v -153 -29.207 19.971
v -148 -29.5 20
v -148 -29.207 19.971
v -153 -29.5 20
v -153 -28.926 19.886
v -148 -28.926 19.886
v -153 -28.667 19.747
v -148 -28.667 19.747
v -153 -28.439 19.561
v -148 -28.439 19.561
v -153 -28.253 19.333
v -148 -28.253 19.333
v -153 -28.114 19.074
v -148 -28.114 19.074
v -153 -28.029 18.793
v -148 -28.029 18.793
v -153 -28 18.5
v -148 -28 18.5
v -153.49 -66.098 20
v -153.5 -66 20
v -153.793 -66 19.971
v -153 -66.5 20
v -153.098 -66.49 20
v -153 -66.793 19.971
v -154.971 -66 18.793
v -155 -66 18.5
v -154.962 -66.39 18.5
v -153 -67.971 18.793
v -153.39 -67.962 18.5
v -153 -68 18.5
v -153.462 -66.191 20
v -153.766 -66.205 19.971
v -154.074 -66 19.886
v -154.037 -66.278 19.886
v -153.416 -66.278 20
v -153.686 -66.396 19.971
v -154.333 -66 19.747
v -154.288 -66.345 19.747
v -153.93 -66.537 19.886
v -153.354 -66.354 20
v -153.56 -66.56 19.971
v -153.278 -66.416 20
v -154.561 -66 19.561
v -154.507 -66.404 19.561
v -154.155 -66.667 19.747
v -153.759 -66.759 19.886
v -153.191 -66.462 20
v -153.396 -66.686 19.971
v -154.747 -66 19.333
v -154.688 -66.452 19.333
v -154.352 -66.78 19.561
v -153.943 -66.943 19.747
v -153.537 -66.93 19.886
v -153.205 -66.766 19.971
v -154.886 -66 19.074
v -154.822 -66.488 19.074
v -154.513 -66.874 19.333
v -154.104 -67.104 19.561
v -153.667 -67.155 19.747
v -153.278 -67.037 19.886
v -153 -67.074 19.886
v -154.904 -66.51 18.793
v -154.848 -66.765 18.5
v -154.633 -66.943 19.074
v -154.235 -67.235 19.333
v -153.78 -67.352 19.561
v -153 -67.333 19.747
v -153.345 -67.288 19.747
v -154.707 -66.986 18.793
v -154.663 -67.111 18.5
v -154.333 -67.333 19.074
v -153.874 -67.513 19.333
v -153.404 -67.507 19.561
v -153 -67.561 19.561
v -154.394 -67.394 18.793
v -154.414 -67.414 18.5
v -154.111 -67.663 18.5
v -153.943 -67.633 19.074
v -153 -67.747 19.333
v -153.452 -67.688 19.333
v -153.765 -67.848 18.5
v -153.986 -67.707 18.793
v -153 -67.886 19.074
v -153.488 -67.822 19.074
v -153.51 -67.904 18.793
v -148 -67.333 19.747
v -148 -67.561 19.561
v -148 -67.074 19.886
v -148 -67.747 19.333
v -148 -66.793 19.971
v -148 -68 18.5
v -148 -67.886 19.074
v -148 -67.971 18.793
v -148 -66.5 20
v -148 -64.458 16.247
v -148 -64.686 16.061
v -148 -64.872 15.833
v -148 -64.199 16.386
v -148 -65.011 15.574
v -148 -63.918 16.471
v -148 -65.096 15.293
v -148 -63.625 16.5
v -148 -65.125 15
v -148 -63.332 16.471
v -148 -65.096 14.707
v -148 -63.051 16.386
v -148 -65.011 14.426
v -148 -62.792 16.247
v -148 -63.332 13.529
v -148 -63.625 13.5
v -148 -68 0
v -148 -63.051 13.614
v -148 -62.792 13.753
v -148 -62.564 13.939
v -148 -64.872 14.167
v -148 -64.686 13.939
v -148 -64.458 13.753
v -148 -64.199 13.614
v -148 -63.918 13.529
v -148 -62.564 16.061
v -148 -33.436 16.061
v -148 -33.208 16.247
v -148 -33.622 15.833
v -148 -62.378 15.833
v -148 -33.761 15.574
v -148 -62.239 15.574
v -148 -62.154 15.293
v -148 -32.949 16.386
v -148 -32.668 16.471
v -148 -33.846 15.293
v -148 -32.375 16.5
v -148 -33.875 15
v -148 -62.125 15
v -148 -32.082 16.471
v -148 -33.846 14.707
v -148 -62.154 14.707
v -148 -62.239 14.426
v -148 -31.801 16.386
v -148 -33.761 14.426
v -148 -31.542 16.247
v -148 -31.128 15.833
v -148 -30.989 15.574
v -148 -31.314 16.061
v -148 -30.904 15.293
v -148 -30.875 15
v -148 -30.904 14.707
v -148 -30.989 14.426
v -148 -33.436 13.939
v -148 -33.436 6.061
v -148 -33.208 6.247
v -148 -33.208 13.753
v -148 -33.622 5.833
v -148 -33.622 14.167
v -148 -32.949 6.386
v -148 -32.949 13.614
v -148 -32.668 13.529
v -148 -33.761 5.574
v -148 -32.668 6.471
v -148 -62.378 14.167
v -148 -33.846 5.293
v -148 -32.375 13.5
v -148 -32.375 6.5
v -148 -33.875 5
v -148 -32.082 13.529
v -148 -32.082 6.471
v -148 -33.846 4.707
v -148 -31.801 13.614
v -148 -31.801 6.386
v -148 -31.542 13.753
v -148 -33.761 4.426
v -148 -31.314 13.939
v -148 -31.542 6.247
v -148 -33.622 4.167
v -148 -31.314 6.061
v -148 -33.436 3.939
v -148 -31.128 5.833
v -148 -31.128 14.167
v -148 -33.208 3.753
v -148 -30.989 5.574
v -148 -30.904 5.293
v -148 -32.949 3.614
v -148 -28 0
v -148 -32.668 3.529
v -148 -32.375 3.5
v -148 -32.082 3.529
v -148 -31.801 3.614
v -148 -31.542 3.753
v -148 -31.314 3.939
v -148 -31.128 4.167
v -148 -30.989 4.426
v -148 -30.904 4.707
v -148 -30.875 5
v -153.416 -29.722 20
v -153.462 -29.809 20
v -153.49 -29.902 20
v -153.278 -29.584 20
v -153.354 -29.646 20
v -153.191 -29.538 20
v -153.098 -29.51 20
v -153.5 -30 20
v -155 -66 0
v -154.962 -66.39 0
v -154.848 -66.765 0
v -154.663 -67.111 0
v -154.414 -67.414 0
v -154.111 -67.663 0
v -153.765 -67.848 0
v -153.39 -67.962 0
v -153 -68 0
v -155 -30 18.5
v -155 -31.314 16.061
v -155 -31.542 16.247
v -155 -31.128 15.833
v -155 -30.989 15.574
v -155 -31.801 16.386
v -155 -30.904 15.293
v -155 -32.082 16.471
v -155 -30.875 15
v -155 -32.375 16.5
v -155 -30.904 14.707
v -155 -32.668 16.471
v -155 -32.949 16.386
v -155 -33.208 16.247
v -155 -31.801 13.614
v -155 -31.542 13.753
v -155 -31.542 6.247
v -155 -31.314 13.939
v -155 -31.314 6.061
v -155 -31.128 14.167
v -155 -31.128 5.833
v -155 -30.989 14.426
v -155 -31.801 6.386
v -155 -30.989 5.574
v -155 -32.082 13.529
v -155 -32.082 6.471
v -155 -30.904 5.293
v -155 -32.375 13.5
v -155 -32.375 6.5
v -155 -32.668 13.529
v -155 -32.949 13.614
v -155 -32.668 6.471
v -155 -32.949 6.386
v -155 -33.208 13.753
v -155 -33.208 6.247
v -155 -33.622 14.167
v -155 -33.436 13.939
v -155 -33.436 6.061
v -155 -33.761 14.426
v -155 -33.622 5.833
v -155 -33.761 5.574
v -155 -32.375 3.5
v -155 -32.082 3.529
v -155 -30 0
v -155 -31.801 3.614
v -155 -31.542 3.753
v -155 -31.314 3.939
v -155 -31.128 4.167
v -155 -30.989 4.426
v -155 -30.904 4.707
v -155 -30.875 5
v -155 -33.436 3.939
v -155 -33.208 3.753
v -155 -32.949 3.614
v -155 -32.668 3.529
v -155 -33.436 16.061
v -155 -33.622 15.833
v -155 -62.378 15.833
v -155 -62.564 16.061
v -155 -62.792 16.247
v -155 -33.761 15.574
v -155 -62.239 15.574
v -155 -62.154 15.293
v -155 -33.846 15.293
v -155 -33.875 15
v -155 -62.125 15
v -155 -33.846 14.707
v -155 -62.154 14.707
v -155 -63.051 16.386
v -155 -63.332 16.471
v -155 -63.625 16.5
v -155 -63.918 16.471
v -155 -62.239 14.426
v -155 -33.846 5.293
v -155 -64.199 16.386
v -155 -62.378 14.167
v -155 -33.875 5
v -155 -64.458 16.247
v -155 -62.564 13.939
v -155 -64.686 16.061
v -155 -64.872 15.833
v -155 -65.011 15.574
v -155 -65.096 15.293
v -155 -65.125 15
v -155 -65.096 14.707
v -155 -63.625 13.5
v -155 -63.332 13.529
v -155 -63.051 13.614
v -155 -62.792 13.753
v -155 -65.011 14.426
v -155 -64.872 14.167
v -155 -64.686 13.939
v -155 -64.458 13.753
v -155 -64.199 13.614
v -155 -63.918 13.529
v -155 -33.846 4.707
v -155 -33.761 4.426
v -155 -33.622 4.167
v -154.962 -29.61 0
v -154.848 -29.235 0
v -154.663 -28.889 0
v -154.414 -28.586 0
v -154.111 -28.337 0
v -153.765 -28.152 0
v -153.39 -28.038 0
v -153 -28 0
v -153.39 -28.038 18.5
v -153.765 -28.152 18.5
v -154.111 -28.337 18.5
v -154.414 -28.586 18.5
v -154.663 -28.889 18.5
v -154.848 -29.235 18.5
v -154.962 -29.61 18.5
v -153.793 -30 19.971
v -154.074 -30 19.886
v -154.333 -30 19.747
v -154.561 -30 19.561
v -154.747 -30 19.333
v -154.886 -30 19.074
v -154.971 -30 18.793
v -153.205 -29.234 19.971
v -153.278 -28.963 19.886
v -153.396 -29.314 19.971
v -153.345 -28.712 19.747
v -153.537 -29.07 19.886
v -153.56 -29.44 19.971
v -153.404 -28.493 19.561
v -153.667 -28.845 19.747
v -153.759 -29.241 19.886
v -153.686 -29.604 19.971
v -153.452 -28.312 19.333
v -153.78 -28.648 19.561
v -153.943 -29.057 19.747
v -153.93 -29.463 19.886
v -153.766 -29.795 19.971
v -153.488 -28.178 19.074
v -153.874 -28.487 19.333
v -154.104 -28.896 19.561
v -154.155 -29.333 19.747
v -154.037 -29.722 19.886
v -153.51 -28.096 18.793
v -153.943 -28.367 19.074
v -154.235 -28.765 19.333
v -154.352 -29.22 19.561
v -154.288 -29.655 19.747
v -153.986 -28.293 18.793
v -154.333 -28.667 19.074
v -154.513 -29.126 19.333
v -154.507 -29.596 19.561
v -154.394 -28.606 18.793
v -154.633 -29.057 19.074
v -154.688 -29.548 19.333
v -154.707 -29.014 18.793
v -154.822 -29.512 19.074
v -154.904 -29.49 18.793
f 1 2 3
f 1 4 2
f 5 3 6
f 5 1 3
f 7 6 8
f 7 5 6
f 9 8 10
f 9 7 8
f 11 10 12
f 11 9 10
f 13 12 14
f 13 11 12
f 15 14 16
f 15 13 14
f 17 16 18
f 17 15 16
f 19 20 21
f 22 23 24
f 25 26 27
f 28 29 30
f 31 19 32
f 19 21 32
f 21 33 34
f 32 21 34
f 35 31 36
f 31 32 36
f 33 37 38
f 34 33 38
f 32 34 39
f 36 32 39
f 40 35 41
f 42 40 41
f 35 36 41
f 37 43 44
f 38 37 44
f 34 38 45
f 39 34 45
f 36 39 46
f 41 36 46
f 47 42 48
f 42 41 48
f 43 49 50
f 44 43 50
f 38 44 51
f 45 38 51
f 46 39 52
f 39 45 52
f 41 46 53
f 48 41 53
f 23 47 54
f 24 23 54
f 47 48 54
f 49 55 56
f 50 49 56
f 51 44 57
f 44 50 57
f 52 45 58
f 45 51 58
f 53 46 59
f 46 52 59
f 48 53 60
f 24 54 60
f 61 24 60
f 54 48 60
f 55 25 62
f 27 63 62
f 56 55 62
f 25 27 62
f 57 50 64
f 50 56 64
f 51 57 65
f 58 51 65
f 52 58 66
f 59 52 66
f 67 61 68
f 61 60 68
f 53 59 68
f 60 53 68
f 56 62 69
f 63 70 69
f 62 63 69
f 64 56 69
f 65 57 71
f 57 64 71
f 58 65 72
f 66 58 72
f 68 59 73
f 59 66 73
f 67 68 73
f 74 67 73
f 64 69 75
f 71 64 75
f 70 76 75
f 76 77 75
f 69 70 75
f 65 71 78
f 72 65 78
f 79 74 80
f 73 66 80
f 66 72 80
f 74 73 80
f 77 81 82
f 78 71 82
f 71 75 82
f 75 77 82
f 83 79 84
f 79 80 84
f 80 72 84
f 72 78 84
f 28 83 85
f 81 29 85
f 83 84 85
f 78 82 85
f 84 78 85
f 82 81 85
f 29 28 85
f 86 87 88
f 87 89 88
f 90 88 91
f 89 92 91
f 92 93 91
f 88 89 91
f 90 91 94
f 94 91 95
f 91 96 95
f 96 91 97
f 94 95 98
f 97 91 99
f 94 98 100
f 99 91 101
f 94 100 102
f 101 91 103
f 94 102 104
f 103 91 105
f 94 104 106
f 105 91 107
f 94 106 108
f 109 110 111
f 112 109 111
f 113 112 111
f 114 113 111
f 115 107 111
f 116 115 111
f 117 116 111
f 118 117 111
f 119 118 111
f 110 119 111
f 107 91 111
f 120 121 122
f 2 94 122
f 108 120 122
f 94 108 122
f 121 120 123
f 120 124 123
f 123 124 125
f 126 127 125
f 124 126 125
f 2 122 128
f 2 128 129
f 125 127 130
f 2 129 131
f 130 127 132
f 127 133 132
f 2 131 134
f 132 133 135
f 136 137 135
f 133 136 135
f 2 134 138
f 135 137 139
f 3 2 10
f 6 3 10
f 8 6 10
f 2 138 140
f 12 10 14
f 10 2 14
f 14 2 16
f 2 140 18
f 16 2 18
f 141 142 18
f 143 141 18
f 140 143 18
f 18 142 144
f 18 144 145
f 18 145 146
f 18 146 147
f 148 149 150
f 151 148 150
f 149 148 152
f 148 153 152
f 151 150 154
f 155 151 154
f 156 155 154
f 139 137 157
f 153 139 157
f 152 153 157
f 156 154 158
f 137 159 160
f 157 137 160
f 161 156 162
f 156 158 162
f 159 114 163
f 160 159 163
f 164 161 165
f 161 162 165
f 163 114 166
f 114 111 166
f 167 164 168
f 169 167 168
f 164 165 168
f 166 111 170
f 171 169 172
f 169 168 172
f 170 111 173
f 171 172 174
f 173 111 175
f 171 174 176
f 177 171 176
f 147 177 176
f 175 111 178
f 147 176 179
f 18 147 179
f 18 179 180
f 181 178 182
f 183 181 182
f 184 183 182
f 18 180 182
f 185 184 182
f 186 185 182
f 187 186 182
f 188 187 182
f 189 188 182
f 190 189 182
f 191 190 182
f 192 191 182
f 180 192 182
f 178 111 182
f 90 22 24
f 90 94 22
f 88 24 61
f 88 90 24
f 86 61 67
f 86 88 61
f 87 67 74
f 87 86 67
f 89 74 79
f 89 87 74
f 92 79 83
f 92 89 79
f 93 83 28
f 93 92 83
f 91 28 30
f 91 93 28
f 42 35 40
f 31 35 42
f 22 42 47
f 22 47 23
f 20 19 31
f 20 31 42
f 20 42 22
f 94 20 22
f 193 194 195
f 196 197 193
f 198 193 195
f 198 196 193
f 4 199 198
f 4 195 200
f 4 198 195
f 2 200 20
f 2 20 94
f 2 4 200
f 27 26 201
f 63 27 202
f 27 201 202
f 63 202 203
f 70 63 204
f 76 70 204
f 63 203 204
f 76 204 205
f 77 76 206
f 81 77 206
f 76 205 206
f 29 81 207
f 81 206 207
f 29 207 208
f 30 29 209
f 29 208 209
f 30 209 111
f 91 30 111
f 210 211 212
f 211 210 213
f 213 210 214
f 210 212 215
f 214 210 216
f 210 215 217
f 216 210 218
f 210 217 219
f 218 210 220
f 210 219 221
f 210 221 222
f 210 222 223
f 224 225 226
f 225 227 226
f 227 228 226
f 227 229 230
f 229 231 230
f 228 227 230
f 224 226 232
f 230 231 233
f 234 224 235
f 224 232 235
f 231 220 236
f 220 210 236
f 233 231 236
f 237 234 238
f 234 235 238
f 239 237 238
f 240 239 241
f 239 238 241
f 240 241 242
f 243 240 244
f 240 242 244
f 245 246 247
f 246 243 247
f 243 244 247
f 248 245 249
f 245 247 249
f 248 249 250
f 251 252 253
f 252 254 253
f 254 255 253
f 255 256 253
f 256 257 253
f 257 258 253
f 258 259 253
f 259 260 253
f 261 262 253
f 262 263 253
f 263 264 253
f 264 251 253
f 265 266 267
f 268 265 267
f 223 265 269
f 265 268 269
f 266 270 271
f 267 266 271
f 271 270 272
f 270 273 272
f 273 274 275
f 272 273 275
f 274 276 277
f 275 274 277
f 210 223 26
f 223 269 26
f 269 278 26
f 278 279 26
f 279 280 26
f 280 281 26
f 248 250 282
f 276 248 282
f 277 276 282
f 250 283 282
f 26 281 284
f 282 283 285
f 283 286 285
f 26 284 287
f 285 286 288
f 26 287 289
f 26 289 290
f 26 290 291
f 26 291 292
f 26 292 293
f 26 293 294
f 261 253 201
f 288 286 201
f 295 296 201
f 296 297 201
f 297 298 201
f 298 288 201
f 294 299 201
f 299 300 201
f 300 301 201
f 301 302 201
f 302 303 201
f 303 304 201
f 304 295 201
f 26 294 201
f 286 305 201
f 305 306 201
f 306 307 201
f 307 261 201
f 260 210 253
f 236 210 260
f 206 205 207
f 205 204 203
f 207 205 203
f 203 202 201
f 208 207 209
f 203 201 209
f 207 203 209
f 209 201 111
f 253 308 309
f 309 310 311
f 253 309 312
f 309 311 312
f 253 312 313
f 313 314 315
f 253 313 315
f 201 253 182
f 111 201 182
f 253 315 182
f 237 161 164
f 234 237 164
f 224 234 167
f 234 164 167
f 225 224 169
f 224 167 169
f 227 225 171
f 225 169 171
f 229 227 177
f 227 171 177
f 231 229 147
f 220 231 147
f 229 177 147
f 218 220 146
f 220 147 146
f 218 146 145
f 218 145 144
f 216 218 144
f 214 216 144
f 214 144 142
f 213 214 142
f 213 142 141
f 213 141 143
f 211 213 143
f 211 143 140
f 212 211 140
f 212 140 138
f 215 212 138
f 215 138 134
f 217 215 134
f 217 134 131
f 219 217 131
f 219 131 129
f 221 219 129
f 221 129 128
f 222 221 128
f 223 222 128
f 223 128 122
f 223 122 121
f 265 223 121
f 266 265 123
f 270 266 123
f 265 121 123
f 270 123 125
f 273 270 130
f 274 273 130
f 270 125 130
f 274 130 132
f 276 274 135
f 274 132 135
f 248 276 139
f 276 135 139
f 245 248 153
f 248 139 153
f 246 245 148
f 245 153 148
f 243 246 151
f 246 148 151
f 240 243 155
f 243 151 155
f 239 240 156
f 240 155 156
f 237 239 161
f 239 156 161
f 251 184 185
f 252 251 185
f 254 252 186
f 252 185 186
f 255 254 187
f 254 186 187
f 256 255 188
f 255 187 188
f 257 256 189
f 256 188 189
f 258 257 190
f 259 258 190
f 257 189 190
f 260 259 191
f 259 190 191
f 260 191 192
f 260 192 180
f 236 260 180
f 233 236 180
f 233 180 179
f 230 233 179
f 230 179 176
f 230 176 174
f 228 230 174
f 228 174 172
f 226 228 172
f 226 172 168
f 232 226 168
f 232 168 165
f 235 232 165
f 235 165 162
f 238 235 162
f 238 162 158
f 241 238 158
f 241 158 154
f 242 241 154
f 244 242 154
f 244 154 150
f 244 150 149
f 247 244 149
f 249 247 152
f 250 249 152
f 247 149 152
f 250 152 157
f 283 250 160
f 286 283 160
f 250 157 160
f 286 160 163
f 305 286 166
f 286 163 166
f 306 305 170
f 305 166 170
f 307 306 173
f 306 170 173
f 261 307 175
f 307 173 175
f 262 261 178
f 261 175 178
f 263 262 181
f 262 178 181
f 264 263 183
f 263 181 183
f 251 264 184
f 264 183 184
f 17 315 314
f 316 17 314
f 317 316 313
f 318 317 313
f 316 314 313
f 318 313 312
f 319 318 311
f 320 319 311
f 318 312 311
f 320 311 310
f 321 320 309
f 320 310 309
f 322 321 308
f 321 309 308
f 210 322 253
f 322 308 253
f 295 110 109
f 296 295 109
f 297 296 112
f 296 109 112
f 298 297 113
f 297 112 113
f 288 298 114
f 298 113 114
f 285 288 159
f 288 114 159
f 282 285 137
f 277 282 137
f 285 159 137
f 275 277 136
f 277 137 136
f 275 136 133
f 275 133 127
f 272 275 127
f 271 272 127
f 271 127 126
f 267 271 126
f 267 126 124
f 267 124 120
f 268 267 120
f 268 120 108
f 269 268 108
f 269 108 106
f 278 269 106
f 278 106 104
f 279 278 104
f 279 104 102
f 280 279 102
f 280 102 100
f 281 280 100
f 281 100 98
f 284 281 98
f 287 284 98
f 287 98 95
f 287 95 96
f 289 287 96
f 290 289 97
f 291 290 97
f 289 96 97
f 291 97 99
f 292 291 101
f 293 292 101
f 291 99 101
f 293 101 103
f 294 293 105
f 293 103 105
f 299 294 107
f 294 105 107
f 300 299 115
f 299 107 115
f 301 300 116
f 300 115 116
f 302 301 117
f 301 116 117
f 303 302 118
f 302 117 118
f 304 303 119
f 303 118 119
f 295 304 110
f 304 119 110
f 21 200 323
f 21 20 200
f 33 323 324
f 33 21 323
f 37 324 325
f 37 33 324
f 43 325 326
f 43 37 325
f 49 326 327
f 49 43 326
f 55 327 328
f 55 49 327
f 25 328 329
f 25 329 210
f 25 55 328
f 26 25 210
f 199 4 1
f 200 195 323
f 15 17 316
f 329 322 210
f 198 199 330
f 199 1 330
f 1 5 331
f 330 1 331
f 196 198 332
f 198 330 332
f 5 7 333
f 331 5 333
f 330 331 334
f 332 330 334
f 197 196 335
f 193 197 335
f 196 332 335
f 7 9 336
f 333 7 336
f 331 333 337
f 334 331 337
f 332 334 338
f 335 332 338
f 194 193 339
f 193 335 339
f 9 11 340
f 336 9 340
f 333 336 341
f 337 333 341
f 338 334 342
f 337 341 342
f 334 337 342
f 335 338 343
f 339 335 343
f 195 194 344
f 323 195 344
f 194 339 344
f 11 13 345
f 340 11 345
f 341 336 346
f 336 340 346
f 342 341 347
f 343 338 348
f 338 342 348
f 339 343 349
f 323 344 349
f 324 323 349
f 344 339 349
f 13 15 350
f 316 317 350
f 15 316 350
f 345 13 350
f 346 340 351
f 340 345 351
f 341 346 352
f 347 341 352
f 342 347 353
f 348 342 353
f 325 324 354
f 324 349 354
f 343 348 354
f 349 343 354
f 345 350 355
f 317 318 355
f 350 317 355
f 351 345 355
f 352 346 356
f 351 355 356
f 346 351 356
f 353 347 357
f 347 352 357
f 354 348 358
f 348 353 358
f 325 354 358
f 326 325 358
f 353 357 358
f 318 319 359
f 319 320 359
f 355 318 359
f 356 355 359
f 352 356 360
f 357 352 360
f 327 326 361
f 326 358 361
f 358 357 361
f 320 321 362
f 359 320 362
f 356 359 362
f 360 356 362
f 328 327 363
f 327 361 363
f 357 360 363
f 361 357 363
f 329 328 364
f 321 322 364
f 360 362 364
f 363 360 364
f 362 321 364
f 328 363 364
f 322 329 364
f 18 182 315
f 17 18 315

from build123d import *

# Parameters (mm, degrees)
BOSS_EXTRUDE1_DEPTH = 20
SKETCH3_R           = 1.5
CUT_EXTRUDE1_DEPTH  = 10
FILLET1_R           = 1.5


with BuildPart() as part:
    # Sketch2 → Boss-Extrude1 (new body)
    with BuildSketch(Plane.XY):
        with BuildLine():
            Line((-148, -28), (-153, -28))
            ThreePointArc((-153, -28), (-154.414213562, -28.585786438), (-155, -30))
            Line((-155, -30), (-155, -66))
            ThreePointArc((-155, -66), (-154.414213562, -67.414213562), (-153, -68))
            Line((-153, -68), (-148, -68))
            Line((-148, -68), (-148, -28))
        make_face()
    extrude(amount=BOSS_EXTRUDE1_DEPTH)

    # Sketch3 → Cut-Extrude1 (cut)
    with BuildSketch(Plane(origin=(-148, 0, 0), x_dir=(0, 0, -1), z_dir=(1, 0, 0))):
        with Locations((-15, -63.625)):
            Circle(SKETCH3_R)
        with Locations((-5, -32.375)):
            Circle(SKETCH3_R)
        with Locations((-15, -32.375)):
            Circle(SKETCH3_R)
    extrude(amount=-CUT_EXTRUDE1_DEPTH, mode=Mode.SUBTRACT)

    # Fillet1
    fillet1_edges = [part.edges().sort_by_distance(p)[0] for p in [
        (-150.5, -68, 20),
        (-150.5, -28, 20),
        (-154.414213562, -28.585786438, 20),
        (-155, -48, 20),
        (-154.414213562, -67.414213562, 20),
    ]]
    fillet(fillet1_edges, radius=FILLET1_R)


solid = part.part
